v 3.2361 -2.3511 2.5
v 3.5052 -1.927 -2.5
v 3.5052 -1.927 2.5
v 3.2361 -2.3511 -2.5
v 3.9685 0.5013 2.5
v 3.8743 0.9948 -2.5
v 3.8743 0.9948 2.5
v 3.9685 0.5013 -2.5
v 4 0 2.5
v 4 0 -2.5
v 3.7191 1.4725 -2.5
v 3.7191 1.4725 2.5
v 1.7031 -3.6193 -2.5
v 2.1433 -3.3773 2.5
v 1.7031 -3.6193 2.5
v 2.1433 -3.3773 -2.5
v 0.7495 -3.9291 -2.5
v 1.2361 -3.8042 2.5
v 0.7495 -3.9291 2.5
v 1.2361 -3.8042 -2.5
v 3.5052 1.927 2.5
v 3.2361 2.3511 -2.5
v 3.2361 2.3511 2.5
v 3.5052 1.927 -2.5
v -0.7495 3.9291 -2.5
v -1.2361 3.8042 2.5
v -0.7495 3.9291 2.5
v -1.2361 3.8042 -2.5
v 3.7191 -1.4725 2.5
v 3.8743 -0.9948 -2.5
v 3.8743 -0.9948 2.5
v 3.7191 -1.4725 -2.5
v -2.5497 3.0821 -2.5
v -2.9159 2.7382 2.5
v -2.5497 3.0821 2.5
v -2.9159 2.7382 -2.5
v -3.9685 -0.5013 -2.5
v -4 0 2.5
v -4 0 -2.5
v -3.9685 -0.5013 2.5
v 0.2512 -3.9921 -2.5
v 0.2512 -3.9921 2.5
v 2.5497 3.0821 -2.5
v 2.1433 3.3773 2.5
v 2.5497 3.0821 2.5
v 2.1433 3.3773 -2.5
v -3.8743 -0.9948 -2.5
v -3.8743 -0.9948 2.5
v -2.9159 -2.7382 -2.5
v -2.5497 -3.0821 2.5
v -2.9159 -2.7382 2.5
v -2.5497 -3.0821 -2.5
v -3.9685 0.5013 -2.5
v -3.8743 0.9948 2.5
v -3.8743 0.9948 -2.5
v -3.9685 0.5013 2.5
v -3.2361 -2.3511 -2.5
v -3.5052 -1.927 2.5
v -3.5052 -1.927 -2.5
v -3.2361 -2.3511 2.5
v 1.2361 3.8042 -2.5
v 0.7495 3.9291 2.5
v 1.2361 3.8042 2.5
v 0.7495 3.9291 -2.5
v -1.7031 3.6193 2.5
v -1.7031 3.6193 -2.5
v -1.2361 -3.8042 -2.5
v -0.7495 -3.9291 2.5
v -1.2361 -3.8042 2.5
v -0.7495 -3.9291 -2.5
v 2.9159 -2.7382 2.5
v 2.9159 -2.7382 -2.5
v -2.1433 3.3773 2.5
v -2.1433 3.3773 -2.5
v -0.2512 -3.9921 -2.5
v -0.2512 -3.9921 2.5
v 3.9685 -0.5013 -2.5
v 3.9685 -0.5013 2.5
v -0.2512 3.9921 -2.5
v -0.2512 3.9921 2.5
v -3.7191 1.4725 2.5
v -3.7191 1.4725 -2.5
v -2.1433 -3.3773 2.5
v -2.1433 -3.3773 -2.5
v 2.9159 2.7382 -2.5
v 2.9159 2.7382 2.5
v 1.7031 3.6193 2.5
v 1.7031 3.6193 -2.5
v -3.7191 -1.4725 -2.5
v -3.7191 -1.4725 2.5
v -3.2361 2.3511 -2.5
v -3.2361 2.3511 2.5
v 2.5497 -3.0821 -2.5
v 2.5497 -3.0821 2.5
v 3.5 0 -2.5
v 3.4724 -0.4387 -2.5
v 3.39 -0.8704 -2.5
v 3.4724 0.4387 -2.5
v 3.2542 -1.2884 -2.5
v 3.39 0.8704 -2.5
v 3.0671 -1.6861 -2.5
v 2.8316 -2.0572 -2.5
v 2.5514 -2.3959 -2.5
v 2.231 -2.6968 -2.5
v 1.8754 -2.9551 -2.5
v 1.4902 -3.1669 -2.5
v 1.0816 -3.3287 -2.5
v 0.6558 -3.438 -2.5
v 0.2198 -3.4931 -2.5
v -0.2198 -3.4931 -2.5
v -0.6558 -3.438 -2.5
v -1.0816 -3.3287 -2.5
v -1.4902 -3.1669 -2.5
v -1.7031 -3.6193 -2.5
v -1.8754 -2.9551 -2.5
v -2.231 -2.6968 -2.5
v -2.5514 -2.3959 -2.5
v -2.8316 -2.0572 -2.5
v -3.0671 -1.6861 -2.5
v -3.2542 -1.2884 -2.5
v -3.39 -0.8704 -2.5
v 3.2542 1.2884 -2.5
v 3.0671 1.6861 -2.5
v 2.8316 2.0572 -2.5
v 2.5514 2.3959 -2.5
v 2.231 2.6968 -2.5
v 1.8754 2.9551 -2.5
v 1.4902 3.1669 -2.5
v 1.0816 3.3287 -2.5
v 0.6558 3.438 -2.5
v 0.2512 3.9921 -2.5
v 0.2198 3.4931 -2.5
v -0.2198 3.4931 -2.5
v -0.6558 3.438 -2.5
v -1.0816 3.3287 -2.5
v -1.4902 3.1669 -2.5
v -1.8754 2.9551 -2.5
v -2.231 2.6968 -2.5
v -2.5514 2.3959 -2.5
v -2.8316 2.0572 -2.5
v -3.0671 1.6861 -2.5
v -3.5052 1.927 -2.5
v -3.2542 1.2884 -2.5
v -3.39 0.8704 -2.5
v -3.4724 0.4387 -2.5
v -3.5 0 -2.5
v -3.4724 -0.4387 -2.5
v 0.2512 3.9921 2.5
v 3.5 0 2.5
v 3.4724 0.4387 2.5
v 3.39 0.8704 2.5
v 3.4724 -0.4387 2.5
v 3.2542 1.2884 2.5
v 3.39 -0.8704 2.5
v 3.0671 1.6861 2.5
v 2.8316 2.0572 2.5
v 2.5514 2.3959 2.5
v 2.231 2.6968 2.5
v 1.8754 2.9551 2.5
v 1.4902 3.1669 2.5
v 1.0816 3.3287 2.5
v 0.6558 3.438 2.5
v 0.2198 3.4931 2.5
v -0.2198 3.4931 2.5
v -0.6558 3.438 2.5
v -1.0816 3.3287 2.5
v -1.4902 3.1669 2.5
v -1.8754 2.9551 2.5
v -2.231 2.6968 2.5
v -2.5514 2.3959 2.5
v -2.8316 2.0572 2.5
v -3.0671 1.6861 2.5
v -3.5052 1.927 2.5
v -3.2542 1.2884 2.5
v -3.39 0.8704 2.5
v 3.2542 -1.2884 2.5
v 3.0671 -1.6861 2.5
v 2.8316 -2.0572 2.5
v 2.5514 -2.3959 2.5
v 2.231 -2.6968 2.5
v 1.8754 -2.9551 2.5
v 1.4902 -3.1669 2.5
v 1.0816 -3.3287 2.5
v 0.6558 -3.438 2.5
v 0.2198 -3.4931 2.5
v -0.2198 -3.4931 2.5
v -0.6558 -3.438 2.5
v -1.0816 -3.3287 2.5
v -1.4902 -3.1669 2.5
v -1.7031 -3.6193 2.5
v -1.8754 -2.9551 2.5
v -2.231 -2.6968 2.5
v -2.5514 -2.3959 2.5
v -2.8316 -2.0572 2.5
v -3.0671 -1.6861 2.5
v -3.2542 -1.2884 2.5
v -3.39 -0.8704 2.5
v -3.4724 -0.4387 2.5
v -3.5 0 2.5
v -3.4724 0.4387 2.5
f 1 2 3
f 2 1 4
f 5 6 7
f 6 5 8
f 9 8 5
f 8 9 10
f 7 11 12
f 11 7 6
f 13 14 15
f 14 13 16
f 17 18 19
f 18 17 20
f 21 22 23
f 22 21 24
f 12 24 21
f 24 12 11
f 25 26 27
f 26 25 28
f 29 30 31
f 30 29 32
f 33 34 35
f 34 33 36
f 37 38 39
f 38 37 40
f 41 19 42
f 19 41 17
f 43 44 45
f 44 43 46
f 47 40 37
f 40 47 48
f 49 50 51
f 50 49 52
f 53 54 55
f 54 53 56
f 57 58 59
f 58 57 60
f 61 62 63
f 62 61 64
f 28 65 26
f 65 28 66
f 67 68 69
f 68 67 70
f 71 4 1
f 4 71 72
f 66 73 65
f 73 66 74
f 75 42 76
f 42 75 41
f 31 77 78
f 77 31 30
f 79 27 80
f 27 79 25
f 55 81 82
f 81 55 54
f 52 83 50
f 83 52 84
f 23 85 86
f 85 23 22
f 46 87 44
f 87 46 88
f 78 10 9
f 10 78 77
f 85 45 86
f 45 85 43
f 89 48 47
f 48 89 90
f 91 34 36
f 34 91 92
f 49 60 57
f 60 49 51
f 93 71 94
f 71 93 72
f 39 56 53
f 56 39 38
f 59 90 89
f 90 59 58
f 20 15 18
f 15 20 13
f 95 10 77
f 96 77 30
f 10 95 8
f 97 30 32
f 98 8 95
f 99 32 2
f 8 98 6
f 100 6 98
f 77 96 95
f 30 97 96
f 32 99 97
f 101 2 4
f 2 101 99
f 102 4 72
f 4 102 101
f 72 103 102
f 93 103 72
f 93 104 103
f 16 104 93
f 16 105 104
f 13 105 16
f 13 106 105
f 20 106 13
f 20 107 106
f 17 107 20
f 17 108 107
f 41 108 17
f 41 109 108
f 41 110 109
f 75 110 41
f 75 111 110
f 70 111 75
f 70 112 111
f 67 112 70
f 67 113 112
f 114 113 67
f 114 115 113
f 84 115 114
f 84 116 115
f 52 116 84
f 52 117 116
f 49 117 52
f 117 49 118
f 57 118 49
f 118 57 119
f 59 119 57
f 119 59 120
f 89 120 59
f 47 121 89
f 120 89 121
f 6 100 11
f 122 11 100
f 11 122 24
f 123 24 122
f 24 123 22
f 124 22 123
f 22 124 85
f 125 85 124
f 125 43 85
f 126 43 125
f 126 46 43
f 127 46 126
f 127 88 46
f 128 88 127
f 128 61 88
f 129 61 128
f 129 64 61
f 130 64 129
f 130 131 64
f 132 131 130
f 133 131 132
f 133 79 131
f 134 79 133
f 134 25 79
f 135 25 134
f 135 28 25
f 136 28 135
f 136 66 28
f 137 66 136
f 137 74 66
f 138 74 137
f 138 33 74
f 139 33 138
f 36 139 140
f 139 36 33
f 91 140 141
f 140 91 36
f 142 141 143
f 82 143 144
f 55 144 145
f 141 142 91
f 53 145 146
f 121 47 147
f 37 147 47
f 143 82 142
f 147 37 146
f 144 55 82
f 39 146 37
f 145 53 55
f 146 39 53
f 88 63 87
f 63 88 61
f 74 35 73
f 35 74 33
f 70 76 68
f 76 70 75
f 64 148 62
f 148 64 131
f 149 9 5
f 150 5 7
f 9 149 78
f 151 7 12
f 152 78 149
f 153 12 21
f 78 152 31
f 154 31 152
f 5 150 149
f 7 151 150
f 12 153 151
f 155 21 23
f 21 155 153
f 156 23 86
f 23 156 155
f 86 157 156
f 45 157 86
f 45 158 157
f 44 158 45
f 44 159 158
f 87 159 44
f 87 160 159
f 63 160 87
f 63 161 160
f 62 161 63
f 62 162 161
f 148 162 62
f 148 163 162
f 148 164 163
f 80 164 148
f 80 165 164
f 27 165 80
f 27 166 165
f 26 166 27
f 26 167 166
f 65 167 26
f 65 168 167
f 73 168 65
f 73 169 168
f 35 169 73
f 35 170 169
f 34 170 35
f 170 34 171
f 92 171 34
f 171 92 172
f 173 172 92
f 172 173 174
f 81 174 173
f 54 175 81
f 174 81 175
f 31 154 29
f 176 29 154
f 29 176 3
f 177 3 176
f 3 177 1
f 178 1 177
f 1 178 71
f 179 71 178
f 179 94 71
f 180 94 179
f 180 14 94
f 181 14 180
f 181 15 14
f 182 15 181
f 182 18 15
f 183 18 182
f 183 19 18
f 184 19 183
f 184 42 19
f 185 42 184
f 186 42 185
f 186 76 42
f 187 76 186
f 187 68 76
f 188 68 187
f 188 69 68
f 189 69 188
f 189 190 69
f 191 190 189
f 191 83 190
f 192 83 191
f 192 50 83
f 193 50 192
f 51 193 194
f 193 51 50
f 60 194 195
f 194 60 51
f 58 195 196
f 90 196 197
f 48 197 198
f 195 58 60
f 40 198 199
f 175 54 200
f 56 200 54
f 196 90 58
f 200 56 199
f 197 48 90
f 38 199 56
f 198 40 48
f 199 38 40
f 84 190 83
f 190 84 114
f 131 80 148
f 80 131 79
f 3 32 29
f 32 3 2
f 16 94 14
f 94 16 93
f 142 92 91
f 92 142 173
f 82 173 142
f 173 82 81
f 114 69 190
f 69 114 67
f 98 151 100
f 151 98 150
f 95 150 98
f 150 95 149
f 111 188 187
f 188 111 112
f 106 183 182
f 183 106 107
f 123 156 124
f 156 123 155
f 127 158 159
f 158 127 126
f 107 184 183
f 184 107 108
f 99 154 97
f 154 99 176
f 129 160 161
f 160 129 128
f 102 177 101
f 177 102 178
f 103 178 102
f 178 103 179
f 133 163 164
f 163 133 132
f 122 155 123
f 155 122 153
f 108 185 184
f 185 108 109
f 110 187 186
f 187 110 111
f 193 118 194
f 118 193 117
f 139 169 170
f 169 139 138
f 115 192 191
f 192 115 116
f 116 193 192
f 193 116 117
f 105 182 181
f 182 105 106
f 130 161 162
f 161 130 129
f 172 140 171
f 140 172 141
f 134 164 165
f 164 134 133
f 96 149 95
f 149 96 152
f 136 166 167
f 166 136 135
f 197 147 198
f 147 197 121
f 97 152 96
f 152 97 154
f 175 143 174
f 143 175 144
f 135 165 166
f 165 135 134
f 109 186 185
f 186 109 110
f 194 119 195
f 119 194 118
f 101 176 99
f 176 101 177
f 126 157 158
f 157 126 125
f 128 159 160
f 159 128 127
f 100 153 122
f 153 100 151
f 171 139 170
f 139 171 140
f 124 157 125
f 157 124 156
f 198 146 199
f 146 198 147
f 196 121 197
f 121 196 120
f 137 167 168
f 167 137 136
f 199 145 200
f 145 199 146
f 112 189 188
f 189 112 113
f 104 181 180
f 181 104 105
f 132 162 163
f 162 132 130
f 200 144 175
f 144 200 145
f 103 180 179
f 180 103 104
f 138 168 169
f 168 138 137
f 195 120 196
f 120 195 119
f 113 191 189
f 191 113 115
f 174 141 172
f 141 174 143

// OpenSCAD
$fn = 50;


difference() {
	union() {
		translate(v = [0, 0, -2.5000000000]) {
			cylinder(h = 5, r = 4.0000000000);
		}
	}
	union() {
		translate(v = [0, 0, -100.0000000000]) {
			cylinder(h = 200, r = 3.5000000000);
		}
	}
}
